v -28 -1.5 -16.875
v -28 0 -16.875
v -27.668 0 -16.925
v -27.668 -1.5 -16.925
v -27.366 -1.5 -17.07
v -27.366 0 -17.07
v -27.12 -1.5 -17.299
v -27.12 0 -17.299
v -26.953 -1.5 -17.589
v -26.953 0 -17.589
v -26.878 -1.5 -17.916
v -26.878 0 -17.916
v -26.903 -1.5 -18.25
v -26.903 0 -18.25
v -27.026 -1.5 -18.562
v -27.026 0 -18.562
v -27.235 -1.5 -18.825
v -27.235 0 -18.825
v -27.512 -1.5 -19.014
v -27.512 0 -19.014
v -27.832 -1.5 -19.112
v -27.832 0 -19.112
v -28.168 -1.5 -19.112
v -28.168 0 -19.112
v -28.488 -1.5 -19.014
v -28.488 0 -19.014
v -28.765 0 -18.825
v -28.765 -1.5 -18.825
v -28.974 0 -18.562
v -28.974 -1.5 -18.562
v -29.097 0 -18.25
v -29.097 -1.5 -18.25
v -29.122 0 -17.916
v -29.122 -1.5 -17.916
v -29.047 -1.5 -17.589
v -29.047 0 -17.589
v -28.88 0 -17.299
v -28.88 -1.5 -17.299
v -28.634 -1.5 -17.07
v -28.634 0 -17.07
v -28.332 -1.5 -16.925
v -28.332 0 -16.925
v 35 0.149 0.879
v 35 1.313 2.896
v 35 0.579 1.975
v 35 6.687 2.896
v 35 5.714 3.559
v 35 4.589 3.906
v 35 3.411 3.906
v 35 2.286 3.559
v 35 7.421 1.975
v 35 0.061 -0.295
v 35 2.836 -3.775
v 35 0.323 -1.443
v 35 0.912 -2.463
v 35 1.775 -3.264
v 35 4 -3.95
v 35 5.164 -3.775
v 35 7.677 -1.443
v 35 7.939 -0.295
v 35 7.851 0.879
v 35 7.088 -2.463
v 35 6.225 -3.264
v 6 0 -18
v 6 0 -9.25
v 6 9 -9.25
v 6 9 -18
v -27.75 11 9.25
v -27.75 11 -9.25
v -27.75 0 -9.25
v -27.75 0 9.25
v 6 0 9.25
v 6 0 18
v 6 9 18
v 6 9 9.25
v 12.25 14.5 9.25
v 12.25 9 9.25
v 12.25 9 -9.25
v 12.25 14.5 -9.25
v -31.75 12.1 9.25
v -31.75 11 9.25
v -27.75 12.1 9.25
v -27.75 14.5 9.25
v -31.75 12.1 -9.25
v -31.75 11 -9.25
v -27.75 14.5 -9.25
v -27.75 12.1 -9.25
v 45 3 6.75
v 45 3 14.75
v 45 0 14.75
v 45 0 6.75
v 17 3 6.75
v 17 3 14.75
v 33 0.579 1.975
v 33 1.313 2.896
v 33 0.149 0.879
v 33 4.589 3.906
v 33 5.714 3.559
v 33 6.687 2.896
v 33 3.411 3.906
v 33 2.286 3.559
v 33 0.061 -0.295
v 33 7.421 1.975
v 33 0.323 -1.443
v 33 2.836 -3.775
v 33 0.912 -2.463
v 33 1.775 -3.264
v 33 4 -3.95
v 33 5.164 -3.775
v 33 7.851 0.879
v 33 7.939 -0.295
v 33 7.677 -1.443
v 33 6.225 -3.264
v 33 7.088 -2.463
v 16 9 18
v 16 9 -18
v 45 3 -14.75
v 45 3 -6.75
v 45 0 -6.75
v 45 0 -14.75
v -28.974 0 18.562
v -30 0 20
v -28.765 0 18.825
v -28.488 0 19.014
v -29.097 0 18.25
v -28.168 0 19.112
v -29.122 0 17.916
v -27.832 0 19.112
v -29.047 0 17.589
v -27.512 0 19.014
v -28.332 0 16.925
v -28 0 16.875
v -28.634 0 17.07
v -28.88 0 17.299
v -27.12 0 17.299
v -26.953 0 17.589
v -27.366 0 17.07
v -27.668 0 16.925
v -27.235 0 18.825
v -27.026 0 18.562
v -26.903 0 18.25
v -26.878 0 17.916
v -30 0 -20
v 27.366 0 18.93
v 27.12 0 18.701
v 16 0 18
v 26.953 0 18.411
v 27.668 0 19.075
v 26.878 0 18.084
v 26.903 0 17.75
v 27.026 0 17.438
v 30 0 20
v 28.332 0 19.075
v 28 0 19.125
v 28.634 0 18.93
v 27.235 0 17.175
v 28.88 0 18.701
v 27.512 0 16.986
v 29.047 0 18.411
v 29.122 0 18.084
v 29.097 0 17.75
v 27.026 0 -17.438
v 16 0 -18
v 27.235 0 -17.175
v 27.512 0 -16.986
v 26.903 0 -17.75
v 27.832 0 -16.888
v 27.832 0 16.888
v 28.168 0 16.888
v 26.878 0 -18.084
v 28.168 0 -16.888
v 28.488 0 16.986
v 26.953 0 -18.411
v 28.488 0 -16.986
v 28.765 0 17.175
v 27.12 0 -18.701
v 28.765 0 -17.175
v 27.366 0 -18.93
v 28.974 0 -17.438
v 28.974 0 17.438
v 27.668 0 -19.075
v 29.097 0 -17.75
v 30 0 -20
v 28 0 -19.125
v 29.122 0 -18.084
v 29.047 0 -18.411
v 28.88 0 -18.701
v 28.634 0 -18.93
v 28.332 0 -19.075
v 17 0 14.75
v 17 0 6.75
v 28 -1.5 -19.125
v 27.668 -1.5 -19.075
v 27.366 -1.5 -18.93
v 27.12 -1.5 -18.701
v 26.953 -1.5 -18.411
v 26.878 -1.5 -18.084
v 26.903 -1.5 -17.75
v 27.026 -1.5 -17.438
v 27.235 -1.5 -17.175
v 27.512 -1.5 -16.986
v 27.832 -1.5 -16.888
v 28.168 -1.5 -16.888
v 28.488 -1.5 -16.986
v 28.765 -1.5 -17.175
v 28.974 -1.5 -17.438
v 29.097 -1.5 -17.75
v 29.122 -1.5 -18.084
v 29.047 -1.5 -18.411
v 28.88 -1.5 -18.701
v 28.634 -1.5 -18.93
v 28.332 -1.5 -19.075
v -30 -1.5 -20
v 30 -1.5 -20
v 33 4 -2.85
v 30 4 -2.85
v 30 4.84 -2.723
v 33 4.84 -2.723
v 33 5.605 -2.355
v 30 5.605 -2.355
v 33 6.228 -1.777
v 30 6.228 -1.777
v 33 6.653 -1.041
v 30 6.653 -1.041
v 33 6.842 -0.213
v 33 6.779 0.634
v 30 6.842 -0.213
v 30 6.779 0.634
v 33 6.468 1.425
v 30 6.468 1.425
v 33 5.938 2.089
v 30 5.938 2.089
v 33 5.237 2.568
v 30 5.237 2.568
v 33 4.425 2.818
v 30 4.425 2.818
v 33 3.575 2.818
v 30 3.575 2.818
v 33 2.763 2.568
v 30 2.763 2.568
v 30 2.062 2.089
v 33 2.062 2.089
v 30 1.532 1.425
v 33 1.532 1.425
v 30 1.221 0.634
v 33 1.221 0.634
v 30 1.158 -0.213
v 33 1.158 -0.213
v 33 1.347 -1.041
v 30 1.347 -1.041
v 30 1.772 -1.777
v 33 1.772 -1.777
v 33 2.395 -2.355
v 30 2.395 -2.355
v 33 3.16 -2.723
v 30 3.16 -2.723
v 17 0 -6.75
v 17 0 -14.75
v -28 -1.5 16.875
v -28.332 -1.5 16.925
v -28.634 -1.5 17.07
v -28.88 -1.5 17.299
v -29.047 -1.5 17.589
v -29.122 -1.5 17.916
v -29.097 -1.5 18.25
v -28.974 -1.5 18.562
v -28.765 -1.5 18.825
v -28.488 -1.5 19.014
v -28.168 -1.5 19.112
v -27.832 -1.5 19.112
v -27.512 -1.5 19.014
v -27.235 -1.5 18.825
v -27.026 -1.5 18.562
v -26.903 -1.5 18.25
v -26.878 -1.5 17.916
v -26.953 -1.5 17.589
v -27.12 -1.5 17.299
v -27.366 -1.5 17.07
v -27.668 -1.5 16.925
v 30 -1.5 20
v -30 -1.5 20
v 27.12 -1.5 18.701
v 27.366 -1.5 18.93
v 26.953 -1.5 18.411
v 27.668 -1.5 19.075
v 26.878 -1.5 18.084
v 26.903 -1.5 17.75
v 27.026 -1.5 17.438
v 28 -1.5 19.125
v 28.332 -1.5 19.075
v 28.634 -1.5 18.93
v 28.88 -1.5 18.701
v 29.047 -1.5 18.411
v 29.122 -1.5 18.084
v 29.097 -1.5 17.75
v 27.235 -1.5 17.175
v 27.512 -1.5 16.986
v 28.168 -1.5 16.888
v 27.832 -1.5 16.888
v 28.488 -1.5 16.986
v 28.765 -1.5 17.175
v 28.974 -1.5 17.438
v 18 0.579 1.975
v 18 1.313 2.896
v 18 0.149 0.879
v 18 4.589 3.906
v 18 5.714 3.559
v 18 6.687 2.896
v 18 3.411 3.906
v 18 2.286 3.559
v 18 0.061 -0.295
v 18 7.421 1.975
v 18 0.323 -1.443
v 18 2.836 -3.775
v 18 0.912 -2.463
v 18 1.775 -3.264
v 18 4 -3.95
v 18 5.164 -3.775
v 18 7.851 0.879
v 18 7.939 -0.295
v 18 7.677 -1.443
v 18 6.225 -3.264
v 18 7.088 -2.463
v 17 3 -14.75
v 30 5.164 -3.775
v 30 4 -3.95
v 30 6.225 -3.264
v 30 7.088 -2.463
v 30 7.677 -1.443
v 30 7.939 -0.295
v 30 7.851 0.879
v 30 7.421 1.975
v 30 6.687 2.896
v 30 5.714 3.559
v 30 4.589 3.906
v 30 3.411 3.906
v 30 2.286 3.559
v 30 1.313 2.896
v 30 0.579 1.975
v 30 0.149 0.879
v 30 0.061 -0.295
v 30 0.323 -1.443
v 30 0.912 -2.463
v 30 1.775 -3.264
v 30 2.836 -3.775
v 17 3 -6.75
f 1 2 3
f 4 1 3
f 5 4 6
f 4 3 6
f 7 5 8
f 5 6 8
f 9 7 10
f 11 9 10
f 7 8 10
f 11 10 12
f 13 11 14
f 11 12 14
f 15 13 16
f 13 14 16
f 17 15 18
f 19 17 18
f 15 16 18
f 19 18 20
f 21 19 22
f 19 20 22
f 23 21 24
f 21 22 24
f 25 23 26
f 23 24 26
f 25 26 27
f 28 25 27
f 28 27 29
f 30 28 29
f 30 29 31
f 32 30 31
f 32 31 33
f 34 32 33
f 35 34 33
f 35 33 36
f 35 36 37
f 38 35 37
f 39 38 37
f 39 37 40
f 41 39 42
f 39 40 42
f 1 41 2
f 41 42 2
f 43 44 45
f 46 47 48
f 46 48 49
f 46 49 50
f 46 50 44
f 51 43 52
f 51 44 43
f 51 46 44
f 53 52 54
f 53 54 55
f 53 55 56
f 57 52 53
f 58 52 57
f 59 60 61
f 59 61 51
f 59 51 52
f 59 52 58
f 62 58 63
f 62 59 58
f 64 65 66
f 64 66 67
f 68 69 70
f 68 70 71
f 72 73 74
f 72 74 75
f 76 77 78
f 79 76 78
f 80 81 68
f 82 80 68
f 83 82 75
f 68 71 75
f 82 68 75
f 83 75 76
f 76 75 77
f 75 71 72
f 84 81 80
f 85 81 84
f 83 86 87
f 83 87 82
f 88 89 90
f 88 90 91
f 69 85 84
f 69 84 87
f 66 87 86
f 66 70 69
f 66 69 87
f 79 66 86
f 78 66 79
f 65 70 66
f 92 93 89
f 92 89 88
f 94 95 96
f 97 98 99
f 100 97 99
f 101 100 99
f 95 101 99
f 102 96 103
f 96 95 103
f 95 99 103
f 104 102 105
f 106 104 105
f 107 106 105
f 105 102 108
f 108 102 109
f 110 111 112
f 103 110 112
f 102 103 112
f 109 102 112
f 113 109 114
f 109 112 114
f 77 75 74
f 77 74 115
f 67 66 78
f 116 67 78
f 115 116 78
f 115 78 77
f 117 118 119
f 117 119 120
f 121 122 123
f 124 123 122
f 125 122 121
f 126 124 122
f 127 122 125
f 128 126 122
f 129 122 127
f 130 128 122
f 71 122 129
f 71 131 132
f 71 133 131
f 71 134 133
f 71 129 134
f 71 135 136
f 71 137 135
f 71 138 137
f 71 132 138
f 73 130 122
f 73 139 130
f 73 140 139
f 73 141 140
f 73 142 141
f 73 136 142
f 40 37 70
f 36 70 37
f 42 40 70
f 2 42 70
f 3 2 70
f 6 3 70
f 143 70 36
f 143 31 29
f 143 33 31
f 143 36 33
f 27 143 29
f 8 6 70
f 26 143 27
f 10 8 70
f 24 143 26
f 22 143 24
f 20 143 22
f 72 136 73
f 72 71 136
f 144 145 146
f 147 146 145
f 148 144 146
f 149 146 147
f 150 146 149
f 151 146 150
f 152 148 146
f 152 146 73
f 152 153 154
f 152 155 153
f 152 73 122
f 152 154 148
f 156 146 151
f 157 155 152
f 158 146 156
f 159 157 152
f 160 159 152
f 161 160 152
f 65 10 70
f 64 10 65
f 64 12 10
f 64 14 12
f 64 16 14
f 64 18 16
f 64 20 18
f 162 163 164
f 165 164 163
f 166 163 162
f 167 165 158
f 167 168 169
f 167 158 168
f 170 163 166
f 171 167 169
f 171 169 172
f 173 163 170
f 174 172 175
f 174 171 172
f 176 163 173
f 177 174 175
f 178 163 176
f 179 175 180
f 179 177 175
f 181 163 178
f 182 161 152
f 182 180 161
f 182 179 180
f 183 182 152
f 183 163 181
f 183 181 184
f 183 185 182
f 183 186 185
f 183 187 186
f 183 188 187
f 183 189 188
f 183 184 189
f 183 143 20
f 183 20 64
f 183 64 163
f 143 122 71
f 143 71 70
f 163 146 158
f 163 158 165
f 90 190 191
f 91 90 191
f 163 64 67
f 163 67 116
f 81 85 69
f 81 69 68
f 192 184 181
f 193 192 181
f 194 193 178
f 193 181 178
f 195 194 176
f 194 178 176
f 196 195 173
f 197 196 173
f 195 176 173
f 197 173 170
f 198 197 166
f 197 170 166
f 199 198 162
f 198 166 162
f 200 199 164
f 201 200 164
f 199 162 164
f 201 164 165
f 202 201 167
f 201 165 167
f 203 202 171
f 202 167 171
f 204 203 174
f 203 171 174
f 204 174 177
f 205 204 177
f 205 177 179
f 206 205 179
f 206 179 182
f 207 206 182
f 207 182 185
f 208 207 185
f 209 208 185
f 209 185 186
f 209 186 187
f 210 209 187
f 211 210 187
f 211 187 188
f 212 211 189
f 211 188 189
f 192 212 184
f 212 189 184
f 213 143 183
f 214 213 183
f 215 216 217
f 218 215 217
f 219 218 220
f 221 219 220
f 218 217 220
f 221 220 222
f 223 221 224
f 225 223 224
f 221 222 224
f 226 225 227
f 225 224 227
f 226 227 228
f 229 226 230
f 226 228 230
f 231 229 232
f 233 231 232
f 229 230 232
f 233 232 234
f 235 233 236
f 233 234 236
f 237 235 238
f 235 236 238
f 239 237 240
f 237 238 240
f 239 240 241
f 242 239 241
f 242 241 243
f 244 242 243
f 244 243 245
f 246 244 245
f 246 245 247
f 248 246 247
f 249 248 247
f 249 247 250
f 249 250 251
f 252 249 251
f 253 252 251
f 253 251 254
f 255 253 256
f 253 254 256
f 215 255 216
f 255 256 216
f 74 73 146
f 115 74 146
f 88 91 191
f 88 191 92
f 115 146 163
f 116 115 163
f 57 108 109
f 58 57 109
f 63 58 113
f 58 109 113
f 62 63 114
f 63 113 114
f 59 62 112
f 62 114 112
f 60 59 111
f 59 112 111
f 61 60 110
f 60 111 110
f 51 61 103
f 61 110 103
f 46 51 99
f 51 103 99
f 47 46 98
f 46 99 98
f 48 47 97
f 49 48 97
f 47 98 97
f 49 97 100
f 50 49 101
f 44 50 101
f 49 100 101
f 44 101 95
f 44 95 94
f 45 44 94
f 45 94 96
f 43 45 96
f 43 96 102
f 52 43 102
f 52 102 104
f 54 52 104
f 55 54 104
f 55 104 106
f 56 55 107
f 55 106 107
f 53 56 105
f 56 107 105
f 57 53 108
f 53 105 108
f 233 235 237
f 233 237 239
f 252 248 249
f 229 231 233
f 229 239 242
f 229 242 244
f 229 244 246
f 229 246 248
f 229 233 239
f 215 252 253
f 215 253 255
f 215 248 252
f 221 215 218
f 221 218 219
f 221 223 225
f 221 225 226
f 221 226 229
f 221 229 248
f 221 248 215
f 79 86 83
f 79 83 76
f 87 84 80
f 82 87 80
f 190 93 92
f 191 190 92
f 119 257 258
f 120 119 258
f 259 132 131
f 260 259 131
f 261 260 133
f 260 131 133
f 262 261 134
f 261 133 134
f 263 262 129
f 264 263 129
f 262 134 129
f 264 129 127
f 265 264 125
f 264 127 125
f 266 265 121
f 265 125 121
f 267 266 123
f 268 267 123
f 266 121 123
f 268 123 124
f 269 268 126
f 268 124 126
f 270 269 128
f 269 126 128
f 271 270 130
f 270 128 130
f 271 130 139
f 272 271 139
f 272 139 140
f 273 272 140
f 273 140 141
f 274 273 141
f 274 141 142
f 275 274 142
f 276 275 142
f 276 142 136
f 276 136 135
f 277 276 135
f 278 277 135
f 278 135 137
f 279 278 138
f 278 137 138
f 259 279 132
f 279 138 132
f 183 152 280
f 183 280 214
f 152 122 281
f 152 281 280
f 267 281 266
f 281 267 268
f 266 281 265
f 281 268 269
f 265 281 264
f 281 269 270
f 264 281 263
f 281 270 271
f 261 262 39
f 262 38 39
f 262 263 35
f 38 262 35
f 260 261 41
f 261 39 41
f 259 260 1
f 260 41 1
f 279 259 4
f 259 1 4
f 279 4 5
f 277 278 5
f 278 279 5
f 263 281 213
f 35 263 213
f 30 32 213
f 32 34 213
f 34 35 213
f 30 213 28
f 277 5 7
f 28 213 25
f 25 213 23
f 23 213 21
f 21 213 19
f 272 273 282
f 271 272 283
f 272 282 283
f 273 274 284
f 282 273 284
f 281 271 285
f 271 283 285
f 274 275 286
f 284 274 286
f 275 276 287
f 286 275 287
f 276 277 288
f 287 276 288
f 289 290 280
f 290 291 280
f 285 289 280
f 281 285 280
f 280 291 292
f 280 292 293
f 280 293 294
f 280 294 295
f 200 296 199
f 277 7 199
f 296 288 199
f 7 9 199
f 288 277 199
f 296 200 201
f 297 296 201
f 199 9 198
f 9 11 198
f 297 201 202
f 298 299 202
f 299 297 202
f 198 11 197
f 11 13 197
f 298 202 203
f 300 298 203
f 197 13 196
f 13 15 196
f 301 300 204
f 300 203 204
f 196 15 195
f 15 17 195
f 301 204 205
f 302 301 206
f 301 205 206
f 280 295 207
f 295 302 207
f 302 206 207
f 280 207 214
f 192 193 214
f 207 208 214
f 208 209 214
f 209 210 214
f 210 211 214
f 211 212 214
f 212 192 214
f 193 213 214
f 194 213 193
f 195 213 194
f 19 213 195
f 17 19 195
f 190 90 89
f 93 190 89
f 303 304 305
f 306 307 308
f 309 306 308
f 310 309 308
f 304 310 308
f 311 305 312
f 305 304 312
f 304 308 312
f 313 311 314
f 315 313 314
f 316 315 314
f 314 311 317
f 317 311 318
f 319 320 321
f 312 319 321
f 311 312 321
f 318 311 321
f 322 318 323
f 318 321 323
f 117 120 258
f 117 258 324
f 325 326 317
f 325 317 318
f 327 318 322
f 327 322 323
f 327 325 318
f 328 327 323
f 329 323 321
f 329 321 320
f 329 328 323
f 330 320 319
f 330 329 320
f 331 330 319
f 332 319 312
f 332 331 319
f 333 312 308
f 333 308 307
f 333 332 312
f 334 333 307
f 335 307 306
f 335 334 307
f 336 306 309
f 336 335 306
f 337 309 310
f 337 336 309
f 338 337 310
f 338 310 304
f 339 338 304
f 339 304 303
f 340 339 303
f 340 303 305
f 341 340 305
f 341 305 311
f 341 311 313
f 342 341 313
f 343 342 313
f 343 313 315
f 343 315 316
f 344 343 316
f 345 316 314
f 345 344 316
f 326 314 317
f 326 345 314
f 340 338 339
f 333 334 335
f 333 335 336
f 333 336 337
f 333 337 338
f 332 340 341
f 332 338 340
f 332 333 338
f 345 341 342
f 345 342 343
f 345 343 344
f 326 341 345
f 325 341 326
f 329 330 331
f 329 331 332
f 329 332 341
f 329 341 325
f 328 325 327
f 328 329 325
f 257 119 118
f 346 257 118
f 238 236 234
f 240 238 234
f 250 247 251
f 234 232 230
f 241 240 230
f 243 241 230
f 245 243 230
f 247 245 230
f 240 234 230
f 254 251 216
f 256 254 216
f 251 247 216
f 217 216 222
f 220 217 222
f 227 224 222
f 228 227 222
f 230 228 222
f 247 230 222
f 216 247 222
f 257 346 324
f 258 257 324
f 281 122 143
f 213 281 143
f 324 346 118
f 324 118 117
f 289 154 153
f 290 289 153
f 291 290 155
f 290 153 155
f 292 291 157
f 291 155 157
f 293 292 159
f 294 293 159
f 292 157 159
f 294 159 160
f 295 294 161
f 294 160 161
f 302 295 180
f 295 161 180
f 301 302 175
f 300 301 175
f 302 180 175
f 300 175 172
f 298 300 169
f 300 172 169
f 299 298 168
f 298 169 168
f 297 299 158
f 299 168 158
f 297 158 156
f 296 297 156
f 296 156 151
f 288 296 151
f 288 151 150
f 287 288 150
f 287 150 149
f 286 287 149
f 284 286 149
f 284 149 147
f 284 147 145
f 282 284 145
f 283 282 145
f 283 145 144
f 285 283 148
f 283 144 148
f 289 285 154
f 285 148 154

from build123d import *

# Parameters (mm, degrees)
SKETCH1_W                  = 60
SKETCH1_H                  = 40
SKETCH1_R                  = 1.125
BOSS_EXTRUDE1_DEPTH        = 1.5
SKETCH2_R                  = 3.95
BOSS_EXTRUDE2_DEPTH        = 12
SKETCH4_R                  = 2.85
BOSS_EXTRUDE3_DEPTH        = 3
BOSS_EXTRUDE4_START        = 3
SKETCH2_2_R                = 3.95
BOSS_EXTRUDE4_DEPTH        = 2
BOSS_EXTRUDE5_DEPTH        = 15
BOSS_EXTRUDE5_DEPTH_BACK   = 13
SKETCH5_W                  = 8
SKETCH5_H                  = 3
BOSS_EXTRUDE5_2_DEPTH      = 15
BOSS_EXTRUDE5_2_DEPTH_BACK = 13
SKETCH6_W                  = 10
SKETCH6_H                  = 36
BOSS_EXTRUDE6_DEPTH        = 9
SKETCH11_W                 = 44
SKETCH11_H                 = 18.5
BOSS_EXTRUDE11_DEPTH       = 14.5
SKETCH12_W                 = 18.5
SKETCH12_H                 = 11
CUT_EXTRUDE1_DEPTH         = 4
SKETCH13_W                 = 18.5
SKETCH13_H                 = 2.4
CUT_EXTRUDE2_DEPTH         = 4


with BuildPart() as part:
    # Sketch1 → Boss-Extrude1 (new body)
    with BuildSketch(Plane(origin=(0, 0, 0), x_dir=(1, 0, 0), z_dir=(0, 1, 0))):
        Rectangle(SKETCH1_W, SKETCH1_H)
        with Locations((-28, 18)):
            Circle(SKETCH1_R, mode=Mode.SUBTRACT)
        with Locations((28, 18)):
            Circle(SKETCH1_R, mode=Mode.SUBTRACT)
        with Locations((-28, -18)):
            Circle(SKETCH1_R, mode=Mode.SUBTRACT)
        with Locations((28, -18)):
            Circle(SKETCH1_R, mode=Mode.SUBTRACT)
    extrude(amount=-BOSS_EXTRUDE1_DEPTH)

    # Sketch6 → Boss-Extrude6 (add)
    with BuildSketch(Plane(origin=(0, 0, 0), x_dir=(1, 0, 0), z_dir=(0, 1, 0))):
        with Locations((11, 0)):
            Rectangle(SKETCH6_W, SKETCH6_H)
    extrude(amount=BOSS_EXTRUDE6_DEPTH)

    # Sketch11 → Boss-Extrude11 (add)
    with BuildSketch(Plane(origin=(0, 0, 0), x_dir=(1, 0, 0), z_dir=(0, 1, 0))):
        with Locations((-9.75, 0)):
            Rectangle(SKETCH11_W, SKETCH11_H)
    extrude(amount=BOSS_EXTRUDE11_DEPTH)

    # Sketch12 → Cut-Extrude1 (cut)
    with BuildSketch(Plane.ZY.offset(31.75)):
        with Locations((0, 5.5)):
            Rectangle(SKETCH12_W, SKETCH12_H)
    extrude(amount=-CUT_EXTRUDE1_DEPTH, mode=Mode.SUBTRACT)

    # Sketch13 → Cut-Extrude2 (cut)
    with BuildSketch(Plane.ZY.offset(31.75)):
        with Locations((0, 13.3)):
            Rectangle(SKETCH13_W, SKETCH13_H)
    extrude(amount=-CUT_EXTRUDE2_DEPTH, mode=Mode.SUBTRACT)


with BuildPart() as body_2:
    # Sketch2 → Boss-Extrude2 (new body)
    with BuildSketch(Plane(origin=(30, 0, 0), x_dir=(0, 0, -1), z_dir=(1, 0, 0))):
        with Locations((0, 4)):
            Circle(SKETCH2_R)
    extrude(amount=-BOSS_EXTRUDE2_DEPTH)


with BuildPart() as body_3:
    # Sketch4 → Boss-Extrude3 (new body)
    with BuildSketch(Plane(origin=(30, 0, 0), x_dir=(0, 0, -1), z_dir=(1, 0, 0))):
        with Locations((0, 4)):
            Circle(SKETCH4_R)
    extrude(amount=BOSS_EXTRUDE3_DEPTH)


with BuildPart() as body_4:
    # Sketch2<2> → Boss-Extrude4 (new body)
    with BuildSketch(Plane(origin=(30, 0, 0), x_dir=(0, 0, -1), z_dir=(1, 0, 0)).offset(BOSS_EXTRUDE4_START)):
        with Locations((0, 4)):
            Circle(SKETCH2_2_R)
    extrude(amount=BOSS_EXTRUDE4_DEPTH)


with BuildPart() as body_5:
    # Sketch5 → Boss-Extrude5 (new, two sides: drawn at the far end of the back side and taken through both)
    with BuildSketch(Plane(origin=(30, 0, 0), x_dir=(0, 0, -1), z_dir=(1, 0, 0)).offset(-BOSS_EXTRUDE5_DEPTH_BACK)):
        with Locations((-10.75, 1.5)):
            Rectangle(SKETCH5_W, SKETCH5_H)
    extrude(amount=BOSS_EXTRUDE5_DEPTH + BOSS_EXTRUDE5_DEPTH_BACK)


with BuildPart() as body_6:
    # Sketch5 → Boss-Extrude5 2 (new, two sides: drawn at the far end of the back side and taken through both)
    with BuildSketch(Plane(origin=(30, 0, 0), x_dir=(0, 0, -1), z_dir=(1, 0, 0)).offset(-BOSS_EXTRUDE5_2_DEPTH_BACK)):
        with Locations((10.75, 1.5)):
            Rectangle(SKETCH5_W, SKETCH5_H)
    extrude(amount=BOSS_EXTRUDE5_2_DEPTH + BOSS_EXTRUDE5_2_DEPTH_BACK)


solid = Compound([part.part, body_2.part, body_3.part, body_4.part, body_5.part, body_6.part])
